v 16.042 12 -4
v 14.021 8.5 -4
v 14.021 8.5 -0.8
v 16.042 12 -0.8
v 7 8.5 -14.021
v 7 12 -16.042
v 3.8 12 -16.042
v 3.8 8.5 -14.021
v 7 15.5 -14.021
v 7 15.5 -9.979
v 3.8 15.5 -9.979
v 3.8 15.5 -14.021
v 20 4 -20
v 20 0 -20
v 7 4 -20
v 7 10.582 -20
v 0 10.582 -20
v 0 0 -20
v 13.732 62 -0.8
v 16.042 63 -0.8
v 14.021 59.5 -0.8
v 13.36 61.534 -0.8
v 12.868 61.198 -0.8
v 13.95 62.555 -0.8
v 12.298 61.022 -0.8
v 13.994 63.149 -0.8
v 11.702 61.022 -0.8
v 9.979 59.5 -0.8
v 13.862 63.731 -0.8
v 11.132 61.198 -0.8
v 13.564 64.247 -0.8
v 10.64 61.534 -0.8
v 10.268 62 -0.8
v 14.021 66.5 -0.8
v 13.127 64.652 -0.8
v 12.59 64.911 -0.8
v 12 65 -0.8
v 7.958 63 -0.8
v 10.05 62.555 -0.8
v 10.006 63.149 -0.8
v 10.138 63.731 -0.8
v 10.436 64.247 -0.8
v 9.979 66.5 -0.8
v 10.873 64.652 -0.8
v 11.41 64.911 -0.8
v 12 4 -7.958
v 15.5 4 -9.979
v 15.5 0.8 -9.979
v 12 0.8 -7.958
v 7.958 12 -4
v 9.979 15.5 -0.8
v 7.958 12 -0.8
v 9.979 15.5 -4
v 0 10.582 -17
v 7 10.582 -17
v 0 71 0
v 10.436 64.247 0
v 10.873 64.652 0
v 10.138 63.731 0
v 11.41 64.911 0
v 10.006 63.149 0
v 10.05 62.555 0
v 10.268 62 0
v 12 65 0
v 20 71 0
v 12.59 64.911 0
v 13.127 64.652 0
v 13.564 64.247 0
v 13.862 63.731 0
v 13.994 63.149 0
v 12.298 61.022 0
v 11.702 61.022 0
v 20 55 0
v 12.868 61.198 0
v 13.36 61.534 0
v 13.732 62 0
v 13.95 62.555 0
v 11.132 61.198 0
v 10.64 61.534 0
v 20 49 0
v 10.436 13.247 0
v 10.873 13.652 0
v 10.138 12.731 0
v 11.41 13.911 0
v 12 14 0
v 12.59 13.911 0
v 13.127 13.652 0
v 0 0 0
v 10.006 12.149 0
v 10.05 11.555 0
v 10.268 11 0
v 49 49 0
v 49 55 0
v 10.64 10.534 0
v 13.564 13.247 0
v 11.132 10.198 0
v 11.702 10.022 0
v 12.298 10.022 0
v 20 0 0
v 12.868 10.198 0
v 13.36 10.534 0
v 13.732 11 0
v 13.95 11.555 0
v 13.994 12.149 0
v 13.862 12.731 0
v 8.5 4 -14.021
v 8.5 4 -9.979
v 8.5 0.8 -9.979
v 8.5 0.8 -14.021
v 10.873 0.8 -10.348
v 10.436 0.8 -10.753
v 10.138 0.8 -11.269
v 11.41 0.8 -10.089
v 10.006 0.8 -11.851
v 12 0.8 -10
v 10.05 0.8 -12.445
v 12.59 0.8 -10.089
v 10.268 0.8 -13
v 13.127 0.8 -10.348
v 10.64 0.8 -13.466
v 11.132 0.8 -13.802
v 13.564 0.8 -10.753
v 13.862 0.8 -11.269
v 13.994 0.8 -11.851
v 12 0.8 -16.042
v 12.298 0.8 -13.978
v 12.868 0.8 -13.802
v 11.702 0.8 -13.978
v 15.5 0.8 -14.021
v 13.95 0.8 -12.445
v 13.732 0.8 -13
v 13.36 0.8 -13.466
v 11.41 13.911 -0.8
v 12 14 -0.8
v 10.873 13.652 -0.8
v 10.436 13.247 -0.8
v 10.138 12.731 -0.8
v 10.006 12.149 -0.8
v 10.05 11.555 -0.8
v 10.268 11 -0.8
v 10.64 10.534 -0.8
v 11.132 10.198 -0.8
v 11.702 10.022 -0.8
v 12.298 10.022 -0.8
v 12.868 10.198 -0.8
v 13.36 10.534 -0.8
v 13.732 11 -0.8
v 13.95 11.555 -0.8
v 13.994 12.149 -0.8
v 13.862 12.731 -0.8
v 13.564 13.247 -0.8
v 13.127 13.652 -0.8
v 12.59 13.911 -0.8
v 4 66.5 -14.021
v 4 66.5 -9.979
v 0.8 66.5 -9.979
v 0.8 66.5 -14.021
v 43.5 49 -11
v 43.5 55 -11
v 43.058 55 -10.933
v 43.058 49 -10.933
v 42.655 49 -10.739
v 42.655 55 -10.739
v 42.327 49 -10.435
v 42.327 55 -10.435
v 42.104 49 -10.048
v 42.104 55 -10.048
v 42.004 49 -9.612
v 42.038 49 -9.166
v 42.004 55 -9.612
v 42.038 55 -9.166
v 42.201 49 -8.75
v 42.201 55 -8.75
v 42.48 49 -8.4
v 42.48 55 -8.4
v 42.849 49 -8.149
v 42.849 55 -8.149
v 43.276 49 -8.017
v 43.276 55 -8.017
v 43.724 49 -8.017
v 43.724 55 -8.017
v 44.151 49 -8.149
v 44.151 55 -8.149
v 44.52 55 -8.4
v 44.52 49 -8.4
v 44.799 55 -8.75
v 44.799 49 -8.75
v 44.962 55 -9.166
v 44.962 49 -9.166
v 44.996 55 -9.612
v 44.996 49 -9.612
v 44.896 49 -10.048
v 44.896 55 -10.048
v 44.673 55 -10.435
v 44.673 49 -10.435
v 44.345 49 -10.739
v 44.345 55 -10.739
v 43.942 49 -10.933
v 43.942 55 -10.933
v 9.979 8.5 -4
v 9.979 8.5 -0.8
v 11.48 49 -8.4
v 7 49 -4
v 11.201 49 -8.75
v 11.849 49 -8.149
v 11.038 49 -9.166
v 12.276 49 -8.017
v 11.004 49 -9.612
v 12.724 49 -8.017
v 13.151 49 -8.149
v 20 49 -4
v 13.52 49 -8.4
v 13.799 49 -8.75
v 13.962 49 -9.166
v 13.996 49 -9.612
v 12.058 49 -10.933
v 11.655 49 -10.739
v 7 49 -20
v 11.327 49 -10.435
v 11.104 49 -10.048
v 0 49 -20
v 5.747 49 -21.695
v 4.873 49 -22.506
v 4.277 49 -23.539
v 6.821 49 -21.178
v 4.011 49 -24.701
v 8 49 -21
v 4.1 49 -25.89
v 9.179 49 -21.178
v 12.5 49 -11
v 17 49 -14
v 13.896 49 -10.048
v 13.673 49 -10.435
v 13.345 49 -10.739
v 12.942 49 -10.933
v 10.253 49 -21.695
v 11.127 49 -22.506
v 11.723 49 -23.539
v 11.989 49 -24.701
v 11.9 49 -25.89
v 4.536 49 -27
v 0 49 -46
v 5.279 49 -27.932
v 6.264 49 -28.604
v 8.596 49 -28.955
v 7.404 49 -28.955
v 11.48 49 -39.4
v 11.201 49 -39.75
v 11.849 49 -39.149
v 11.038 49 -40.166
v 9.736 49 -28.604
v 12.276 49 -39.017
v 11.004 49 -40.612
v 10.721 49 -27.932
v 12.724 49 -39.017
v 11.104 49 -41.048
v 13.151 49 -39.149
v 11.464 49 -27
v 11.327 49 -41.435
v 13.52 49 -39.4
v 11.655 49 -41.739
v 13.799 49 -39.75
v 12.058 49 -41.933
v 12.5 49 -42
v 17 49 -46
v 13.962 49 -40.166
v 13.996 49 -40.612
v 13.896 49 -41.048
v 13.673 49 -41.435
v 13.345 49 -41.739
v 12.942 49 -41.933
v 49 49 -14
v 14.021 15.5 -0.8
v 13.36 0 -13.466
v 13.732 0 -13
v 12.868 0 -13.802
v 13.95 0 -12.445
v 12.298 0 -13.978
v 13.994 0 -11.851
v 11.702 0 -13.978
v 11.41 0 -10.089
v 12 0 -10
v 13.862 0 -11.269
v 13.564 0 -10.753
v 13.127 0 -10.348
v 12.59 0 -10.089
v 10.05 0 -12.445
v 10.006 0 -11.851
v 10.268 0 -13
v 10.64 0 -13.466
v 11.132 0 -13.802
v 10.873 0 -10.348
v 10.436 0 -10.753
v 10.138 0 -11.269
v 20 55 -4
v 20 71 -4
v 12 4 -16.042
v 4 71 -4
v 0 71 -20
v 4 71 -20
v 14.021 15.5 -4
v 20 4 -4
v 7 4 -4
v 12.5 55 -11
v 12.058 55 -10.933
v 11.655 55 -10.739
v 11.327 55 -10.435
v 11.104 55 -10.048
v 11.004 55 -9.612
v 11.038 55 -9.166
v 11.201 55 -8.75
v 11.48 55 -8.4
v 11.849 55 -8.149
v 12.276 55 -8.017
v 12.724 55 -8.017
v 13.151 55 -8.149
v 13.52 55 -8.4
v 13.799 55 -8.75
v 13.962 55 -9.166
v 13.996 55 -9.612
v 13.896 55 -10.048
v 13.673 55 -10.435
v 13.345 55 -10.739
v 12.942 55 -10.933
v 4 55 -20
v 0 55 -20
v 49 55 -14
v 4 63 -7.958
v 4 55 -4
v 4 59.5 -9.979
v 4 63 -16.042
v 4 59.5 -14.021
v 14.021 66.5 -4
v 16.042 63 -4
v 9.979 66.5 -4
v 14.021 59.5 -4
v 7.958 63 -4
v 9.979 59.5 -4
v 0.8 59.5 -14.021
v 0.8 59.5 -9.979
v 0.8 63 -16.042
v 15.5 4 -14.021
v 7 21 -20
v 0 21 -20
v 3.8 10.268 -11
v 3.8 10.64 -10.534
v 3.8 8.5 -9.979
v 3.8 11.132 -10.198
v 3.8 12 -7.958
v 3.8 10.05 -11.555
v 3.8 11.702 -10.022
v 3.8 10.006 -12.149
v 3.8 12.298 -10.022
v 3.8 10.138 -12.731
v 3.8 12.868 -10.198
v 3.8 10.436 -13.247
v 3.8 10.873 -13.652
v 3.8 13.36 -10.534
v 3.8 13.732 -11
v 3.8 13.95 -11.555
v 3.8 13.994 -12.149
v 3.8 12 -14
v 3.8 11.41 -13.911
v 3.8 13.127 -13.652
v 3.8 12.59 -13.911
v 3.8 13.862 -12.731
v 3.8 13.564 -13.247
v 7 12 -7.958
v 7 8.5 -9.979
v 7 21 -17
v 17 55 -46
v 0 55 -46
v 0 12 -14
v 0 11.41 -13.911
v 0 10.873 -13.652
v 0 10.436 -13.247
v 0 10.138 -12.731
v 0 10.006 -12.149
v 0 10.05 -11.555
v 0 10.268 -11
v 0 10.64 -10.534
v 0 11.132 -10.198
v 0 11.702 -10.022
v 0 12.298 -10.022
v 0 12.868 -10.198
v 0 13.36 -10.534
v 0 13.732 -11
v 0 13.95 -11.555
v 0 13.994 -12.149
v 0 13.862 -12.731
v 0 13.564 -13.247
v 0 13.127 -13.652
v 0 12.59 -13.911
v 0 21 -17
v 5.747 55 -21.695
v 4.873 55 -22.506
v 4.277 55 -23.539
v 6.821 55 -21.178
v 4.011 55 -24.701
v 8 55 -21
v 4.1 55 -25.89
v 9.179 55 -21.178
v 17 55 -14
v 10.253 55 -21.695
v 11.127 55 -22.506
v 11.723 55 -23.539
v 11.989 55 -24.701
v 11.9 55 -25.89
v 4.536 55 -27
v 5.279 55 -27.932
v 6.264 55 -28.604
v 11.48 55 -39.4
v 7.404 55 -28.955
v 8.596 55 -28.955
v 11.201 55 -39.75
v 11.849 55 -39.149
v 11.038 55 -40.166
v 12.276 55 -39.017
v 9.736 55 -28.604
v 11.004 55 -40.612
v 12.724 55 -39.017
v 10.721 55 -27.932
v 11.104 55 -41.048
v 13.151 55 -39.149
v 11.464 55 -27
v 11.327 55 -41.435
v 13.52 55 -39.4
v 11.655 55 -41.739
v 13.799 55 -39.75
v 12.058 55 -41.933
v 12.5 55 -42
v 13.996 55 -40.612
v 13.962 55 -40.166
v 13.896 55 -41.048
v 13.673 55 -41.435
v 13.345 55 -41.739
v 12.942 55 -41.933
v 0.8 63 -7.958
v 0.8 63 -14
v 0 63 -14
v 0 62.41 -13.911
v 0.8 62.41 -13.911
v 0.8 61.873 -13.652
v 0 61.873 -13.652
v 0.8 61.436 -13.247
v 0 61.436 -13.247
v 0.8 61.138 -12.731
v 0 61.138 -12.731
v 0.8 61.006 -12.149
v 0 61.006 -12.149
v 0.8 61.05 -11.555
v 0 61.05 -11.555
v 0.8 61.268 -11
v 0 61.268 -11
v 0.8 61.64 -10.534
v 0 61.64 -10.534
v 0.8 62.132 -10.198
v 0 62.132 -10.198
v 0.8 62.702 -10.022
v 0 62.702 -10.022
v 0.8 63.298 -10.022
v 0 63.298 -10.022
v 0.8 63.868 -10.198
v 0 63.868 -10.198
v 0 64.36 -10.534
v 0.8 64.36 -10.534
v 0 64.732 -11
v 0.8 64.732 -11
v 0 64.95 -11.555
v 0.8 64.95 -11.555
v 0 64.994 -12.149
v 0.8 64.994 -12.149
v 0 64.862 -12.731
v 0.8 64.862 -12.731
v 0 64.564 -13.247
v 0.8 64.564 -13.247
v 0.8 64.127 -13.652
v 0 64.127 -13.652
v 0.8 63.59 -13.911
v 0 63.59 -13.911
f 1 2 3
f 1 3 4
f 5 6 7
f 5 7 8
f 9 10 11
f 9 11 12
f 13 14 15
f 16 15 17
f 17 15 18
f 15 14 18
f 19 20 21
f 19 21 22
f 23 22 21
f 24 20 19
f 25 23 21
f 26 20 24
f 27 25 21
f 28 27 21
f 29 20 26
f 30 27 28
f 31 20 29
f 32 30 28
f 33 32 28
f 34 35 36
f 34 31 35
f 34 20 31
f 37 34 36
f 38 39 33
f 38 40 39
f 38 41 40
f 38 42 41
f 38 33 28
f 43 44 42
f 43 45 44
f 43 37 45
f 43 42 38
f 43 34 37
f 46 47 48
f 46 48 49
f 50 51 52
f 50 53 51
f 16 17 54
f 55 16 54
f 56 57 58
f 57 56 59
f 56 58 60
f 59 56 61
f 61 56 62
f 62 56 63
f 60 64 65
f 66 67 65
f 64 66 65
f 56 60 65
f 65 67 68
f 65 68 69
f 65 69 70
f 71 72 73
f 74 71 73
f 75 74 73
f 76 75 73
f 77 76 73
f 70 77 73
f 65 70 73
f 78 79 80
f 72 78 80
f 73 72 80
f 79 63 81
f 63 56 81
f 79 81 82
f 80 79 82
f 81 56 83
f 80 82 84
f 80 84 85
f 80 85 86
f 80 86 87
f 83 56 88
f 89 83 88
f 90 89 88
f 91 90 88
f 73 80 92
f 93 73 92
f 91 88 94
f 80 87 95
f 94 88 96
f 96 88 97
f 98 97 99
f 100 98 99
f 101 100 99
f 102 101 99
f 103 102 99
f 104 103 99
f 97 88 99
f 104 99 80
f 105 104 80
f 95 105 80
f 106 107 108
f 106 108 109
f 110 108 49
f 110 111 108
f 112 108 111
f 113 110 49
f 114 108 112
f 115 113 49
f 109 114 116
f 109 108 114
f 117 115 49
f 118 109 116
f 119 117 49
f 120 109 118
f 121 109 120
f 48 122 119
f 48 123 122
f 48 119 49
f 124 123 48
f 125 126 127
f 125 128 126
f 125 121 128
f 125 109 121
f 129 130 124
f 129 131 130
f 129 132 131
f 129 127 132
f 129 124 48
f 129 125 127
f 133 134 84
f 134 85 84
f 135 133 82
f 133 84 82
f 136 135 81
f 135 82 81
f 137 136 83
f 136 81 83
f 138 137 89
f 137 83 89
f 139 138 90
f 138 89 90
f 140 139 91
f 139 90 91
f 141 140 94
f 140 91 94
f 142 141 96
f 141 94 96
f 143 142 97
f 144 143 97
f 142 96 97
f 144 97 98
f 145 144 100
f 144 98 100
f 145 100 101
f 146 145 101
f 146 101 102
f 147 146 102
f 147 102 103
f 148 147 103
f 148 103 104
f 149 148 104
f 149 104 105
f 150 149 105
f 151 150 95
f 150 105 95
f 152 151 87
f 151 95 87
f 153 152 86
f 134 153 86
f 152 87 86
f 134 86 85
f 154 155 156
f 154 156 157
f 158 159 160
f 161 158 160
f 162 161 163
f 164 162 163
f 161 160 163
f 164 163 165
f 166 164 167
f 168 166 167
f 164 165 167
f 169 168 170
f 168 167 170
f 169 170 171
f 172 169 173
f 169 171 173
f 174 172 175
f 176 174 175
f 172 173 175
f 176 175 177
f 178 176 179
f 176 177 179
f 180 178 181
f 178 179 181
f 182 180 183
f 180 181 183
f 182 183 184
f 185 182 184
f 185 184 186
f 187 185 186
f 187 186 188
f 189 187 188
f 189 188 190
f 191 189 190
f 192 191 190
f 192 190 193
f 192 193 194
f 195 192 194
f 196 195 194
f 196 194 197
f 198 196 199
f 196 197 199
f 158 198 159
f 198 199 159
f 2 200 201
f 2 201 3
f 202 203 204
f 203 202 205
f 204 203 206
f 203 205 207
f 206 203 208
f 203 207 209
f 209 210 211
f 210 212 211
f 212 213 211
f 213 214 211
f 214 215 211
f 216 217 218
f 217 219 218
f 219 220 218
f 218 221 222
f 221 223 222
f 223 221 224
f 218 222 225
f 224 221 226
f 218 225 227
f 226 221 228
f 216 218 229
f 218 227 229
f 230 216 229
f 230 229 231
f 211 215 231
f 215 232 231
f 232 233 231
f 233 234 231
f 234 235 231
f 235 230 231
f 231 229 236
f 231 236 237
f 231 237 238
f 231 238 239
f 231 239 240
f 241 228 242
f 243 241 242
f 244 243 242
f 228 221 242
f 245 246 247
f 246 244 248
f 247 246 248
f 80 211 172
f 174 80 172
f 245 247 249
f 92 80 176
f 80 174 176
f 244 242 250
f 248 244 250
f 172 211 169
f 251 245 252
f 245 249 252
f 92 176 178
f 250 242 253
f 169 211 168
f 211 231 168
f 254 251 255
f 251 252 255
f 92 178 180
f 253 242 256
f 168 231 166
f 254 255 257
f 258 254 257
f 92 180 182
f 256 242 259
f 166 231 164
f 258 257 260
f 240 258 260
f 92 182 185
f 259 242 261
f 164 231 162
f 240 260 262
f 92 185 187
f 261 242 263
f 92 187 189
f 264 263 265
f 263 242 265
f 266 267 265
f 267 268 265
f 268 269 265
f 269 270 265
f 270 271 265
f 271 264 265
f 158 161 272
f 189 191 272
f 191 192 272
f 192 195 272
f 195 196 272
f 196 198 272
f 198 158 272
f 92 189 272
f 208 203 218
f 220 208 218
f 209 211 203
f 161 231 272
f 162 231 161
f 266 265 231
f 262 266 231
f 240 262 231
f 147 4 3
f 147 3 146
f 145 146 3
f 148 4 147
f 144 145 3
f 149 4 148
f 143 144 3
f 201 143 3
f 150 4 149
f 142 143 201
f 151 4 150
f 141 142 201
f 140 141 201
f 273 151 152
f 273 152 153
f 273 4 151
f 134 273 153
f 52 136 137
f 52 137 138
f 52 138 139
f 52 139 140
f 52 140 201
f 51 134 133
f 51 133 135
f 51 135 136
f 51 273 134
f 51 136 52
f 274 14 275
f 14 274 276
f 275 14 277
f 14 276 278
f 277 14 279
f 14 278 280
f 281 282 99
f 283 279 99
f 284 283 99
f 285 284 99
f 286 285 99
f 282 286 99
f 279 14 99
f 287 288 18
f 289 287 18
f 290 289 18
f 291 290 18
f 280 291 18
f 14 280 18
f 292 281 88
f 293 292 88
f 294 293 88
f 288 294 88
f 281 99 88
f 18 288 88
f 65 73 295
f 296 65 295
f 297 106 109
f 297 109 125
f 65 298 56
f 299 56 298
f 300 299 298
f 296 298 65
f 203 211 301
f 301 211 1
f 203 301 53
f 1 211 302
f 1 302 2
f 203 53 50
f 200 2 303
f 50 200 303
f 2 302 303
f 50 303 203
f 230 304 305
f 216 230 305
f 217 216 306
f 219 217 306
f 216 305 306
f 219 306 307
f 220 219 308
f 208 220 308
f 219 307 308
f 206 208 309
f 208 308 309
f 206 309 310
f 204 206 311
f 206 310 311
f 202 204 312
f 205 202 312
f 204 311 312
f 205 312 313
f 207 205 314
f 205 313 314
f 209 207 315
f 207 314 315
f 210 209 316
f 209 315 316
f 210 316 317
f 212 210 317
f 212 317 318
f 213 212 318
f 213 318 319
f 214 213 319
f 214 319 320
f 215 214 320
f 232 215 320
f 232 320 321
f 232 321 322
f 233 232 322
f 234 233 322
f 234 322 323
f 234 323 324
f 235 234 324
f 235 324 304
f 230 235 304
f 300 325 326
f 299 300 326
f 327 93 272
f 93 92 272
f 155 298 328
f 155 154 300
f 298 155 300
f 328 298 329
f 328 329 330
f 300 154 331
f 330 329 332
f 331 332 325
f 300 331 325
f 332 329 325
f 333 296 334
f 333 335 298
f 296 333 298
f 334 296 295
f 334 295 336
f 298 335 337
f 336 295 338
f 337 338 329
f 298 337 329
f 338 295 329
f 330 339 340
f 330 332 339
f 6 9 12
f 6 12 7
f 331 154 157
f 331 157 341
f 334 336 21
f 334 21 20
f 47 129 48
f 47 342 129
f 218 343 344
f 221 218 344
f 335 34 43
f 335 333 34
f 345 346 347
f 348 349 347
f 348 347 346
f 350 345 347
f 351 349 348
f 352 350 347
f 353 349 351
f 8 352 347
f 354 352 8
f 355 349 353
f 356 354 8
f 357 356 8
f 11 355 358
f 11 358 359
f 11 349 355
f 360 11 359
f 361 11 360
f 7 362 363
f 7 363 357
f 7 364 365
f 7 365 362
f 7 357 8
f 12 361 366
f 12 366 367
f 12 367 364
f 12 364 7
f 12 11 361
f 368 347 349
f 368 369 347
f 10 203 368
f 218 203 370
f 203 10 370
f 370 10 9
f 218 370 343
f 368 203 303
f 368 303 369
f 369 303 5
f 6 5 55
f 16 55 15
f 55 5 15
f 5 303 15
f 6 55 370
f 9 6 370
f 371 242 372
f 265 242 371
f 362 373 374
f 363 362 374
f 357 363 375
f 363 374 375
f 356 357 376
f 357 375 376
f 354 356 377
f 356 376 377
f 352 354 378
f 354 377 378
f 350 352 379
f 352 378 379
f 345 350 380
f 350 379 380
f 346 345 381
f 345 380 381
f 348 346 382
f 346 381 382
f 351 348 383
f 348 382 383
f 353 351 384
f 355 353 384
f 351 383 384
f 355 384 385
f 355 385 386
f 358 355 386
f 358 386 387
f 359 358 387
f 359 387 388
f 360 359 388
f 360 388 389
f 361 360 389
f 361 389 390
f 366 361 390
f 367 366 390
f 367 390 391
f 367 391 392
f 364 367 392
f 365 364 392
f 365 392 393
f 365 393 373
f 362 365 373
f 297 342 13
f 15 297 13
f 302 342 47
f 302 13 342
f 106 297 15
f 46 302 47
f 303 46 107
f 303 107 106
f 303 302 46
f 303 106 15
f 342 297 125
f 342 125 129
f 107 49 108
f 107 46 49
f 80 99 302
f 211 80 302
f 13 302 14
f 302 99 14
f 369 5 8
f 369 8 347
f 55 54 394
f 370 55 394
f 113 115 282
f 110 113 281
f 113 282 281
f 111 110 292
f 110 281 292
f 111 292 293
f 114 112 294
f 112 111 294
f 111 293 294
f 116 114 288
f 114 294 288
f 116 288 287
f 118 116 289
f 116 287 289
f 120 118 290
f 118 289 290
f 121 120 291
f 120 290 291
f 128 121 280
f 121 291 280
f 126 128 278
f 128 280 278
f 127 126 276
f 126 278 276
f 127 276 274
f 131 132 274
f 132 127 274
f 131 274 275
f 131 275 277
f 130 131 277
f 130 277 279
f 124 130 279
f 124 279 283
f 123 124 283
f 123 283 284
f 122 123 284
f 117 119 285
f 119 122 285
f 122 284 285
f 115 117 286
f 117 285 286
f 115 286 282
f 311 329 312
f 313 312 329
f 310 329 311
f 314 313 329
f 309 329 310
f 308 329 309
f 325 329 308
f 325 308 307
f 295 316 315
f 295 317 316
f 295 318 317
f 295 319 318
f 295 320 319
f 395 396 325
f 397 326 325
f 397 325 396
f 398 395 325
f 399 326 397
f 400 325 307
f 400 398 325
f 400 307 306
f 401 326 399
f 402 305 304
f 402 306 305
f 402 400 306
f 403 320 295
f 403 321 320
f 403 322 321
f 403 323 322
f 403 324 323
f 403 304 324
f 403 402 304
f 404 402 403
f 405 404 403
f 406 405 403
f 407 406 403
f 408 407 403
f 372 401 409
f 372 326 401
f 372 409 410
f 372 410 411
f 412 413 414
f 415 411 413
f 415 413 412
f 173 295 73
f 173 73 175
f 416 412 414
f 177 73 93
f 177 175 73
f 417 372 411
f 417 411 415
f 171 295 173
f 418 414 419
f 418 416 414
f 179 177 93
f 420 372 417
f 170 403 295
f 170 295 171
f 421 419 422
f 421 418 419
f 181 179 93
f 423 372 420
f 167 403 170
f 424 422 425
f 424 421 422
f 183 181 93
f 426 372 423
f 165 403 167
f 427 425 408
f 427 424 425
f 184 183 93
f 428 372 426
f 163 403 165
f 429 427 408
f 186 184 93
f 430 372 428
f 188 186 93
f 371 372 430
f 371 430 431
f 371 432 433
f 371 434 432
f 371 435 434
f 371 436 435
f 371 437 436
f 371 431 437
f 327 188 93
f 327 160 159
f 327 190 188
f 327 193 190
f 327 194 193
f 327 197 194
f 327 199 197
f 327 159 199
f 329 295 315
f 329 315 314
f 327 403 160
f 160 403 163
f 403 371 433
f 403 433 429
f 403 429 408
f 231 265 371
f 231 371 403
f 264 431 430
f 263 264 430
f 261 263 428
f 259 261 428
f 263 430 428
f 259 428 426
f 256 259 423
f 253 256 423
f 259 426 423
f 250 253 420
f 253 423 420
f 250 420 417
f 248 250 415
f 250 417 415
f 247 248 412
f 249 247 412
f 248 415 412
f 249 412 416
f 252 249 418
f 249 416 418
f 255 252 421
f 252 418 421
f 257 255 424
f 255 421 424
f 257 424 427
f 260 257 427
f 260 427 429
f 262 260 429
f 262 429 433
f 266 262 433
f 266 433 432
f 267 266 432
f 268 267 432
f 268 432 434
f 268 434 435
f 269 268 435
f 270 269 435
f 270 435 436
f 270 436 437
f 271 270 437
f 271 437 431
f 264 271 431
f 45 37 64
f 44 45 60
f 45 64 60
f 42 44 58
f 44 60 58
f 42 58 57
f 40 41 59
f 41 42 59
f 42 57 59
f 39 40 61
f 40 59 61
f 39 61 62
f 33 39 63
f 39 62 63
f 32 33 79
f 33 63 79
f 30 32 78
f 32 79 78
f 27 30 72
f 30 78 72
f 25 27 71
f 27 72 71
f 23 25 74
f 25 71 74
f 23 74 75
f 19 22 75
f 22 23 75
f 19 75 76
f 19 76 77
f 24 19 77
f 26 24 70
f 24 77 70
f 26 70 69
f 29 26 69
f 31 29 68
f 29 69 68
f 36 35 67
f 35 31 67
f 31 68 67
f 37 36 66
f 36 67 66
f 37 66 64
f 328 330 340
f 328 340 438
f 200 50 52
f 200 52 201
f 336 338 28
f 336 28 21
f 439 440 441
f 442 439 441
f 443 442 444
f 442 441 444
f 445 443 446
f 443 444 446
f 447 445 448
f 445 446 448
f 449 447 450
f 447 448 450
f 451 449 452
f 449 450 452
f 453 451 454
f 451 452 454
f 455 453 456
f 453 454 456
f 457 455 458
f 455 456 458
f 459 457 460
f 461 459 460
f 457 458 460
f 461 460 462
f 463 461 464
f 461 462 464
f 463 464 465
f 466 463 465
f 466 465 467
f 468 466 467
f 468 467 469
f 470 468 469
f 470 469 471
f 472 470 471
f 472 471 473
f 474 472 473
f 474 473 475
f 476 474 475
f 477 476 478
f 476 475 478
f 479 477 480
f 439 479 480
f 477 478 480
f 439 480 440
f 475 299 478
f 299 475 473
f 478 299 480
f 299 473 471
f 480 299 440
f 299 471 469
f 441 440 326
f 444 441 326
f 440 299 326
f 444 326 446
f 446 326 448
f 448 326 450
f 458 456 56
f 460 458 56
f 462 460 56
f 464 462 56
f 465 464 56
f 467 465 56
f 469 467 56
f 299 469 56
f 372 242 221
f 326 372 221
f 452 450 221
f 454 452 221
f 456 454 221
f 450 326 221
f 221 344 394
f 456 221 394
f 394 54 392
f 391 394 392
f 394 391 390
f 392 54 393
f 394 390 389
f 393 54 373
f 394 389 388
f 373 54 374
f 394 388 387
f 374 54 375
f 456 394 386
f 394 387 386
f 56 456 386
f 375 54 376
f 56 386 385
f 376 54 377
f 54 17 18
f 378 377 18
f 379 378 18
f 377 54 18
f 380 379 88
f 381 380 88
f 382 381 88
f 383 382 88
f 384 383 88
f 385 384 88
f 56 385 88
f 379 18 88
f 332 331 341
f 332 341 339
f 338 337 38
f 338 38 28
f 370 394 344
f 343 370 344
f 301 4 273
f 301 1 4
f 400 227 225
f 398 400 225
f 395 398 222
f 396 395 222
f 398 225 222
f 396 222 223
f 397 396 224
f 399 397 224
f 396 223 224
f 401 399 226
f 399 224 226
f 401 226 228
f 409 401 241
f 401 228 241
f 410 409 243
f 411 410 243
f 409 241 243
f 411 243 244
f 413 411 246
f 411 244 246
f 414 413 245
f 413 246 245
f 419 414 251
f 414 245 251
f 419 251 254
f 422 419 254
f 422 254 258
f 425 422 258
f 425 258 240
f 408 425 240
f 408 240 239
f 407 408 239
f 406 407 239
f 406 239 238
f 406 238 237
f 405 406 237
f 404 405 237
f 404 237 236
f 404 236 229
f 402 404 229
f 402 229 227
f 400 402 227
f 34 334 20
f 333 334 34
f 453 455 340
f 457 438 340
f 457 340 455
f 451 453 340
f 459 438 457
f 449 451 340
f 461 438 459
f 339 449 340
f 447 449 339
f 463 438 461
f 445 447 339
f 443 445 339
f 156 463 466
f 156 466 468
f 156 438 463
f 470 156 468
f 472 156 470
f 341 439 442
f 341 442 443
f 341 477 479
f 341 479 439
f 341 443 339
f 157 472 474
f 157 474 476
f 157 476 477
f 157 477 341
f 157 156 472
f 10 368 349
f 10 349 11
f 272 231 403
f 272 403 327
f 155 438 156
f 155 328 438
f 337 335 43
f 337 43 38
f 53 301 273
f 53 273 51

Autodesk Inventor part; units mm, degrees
ref_plane "YZ Plane" through (0, 0, 0) normal (1, 0, 0) x (0, 1, 0)
ref_plane "XZ Plane" through (0, 0, 0) normal (0, 1, 0) x (-1, 0, 0)
ref_plane "XY Plane" through (0, 0, 0) normal (0, 0, 1) x (1, 0, 0)
sketch "Sketch1" plane through (0, 0, 0) normal (0, 1, 0) x (-1, 0, 0)
  line L0 (0, 0) -> (-20, 0)
  line L1 (-20, 0) -> (-20, -20)
  line L2 (-20, -20) -> (0, -20)
  line L3 (0, -20) -> (0, 0)
  dimension "d0" = 20
  dimension "d1" = 20
extrude "Extrusion1" add sketch "Sketch1" along normal blind 4
sketch "Sketch2" plane through (0, 4, 0) normal (0, 1, 0) x (1, 0, 0)
  line L0 (0, 0) -> (20, 0)
  line L1 (20, 0) -> (20, 4)
  line L2 (20, 4) -> (7, 4)
  line L3 (0, 4) -> (0, 0)
  line L4 (0, 0) -> (4, 0)
  line L5 (7, 20) -> (0, 20)
  line L6 (0, 20) -> (0, 0)
  line L7 (7, 4) -> (7, 20)
  line L8 (0, 0) -> (20, 0) projected
  line L9 (0, 0) -> (20, 0)
  line L10 (0, 20) -> (0, 0) projected
  line L11 (0, 0) -> (0, 20)
  dimension "d123" = 7
extrude "Extrusion2" add sketch "Sketch2" along normal blind 45
hole "Hole2" at (12, 12, -4) direction (0, 0, 1) diameter 4 end through all
hole "Hole3" at (7, 12, -12) direction (-1, 0, 0) diameter 4 end through all
hole "Hole4" at (12, 4, -12) direction (0, -1, 0) diameter 4 end through all
sketch "Sketch3" plane through (20, 4, -4) normal (0, 0, -1) x (-1, 0, 0)
  line L0 (12.0415, 8) -> (10.0207, 4.5)
  line L1 (10.0207, 4.5) -> (5.9793, 4.5)
  line L2 (5.9793, 4.5) -> (3.9585, 8)
  line L3 (3.9585, 8) -> (5.9793, 11.5)
  line L4 (5.9793, 11.5) -> (10.0207, 11.5)
  line L5 (10.0207, 11.5) -> (12.0415, 8)
  point P0 (20, -4)
  point P1 (8, 8)
  dimension "d51" = 7
sketch "Sketch4" plane through (7, 4, -4) normal (1, 0, 0) x (0, 0, -1)
  line L0 (12.0415, 8) -> (10.0207, 4.5)
  line L1 (10.0207, 4.5) -> (5.9793, 4.5)
  line L2 (5.9793, 4.5) -> (3.9585, 8)
  line L3 (3.9585, 8) -> (5.9793, 11.5)
  line L4 (5.9793, 11.5) -> (10.0207, 11.5)
  line L5 (10.0207, 11.5) -> (12.0415, 8)
  point P0 (-4, -4)
  point P1 (8, 8)
  dimension "d52" = 7
sketch "Sketch5" plane through (0, 4, 0) normal (0, 1, 0) x (1, 0, 0)
  circle A0 centre (12, 12) radius 2 projected
  line L0 (12, 7.9585) -> (8.5, 9.9793)
  line L1 (8.5, 9.9793) -> (8.5, 14.0207)
  line L2 (8.5, 14.0207) -> (12, 16.0415)
  line L3 (12, 16.0415) -> (15.5, 14.0207)
  line L4 (15.5, 14.0207) -> (15.5, 9.9793)
  line L5 (15.5, 9.9793) -> (12, 7.9585)
  point P0 (0, 0)
  dimension "d53" = 7
extrude "Extrusion3" cut sketch "Sketch3" against normal blind 3.2
extrude "Extrusion4" cut sketch "Sketch4" against normal blind 3.2
extrude "Extrusion5" cut sketch "Sketch5" against normal blind 3.2
sketch "Sketch6" plane through (0, 49, 0) normal (0, 1, 0) x (1, 0, 0)
  line L0 (0, 0) -> (20, 0) projected
  line L1 (0, 0) -> (0, 46)
  line L2 (0, 20) -> (0, 0) projected
  line L3 (0, 0) -> (49, 0)
  line L4 (49, 0) -> (49, 14)
  line L5 (0, 46) -> (17, 46)
  line L6 (17, 46) -> (17, 14)
  line L7 (17, 14) -> (49, 14)
  line L8 (20, 4) -> (7, 4) projected
  line L9 (7, 4) -> (7, 20) projected
  line L10 (20, 20) -> (7, 20) projected
  line L11 (20, 4) -> (20, 20) projected
  line L12 (43.5, 9.5) -> (12.5, 40.5) construction
  line L13 (12.5, 9.5) -> (28, 25) construction
  point P0 (8, 25)
  dimension "d62" = 17
  dimension "d65" = 42
  dimension "d66" = 42
  dimension "d68" = 5.5
  dimension "d69" = 5.5
  dimension "d70" = 31
  dimension "d71" = 31
  dimension "d72" = 14
  dimension "d121" = 8
  dimension "d122" = 25
extrude "Extrusion6" add sketch "Sketch6" along normal blind 6 contours L1 L5 L6 L10 L9 L8 L11 L7 L4 L3 L0 | L11 L8 L9 L10 L6 L7
hole "Hole5" at (12.5, 49, -9.5) at (12.5, 49, -40.5) at (43.5, 49, -9.5) direction (0, 1, 0) diameter 3 end through all
sketch "Sketch7" plane through (0, 55, 0) normal (0, 1, 0) x (1, 0, 0)
  line L0 (0, 0) -> (20, 0) projected
  line L1 (20, 4) -> (7, 4) projected
  line L2 (0, 0) -> (20, 0)
  line L3 (20, 0) -> (20, 4)
  line L4 (20, 4) -> (4, 4)
  line L5 (0, 4) -> (0, 0)
  line L6 (0, 0) -> (4, 0)
  line L7 (4, 20) -> (0, 20)
  line L8 (0, 20) -> (0, 0)
  line L9 (4, 4) -> (4, 20)
  dimension "d82" = 20
  dimension "d83" = 4
  dimension "d84" = 4
  dimension "d85" = 20
extrude "Extrusion7" add sketch "Sketch7" along normal blind 16
hole "Hole6" at (12, 63, -4) direction (0, 0, 1) diameter 4 end through all
hole "Hole7" at (4, 63, -12) direction (-1, 0, 0) diameter 4 end through all
sketch "Sketch8" plane through (4, 55, -4) normal (1, 0, 0) x (0, 0, -1)
  line L0 (3.9585, 8) -> (5.9793, 11.5)
  line L1 (5.9793, 11.5) -> (10.0207, 11.5)
  line L2 (10.0207, 11.5) -> (12.0415, 8)
  line L3 (12.0415, 8) -> (10.0207, 4.5)
  line L4 (10.0207, 4.5) -> (5.9793, 4.5)
  line L5 (5.9793, 4.5) -> (3.9585, 8)
  point P0 (-4, -55)
  point P1 (8, 8)
  dimension "d106" = 7
sketch "Sketch9" plane through (20, 55, -4) normal (0, 0, -1) x (-1, 0, 0)
  circle A0 centre (8, 8) radius 2 projected
  line L0 (3.9585, 8) -> (5.9793, 11.5)
  line L1 (5.9793, 11.5) -> (10.0207, 11.5)
  line L2 (10.0207, 11.5) -> (12.0415, 8)
  line L3 (12.0415, 8) -> (10.0207, 4.5)
  line L4 (10.0207, 4.5) -> (5.9793, 4.5)
  line L5 (5.9793, 4.5) -> (3.9585, 8)
  point P0 (20, -55)
  dimension "d107" = 7
extrude "Extrusion8" cut sketch "Sketch9" against normal blind 3.2
extrude "Extrusion9" cut sketch "Sketch8" against normal blind 3.2
hole "Hole8" at (8, 55, -25) direction (0, -1, 0) diameter 8 end through all
sketch "Sketch11" plane through (0, 0, -20) normal (-1, 0, 0) x (0, 0, 1)
  line L0 (0, 0) -> (0, 49) projected
  line L1 (0, 10.5822) -> (3, 10.5822)
  line L2 (3, 10.5822) -> (3, 21)
  line L3 (3, 21) -> (0, 21)
  line L4 (0, 21) -> (0, 10.5822)
  point P0 (20, 0)
extrude "Extrusion10" cut sketch "Sketch11" against normal blind 10
properties part number "MotorMountLeft" material "PLA Orange"
